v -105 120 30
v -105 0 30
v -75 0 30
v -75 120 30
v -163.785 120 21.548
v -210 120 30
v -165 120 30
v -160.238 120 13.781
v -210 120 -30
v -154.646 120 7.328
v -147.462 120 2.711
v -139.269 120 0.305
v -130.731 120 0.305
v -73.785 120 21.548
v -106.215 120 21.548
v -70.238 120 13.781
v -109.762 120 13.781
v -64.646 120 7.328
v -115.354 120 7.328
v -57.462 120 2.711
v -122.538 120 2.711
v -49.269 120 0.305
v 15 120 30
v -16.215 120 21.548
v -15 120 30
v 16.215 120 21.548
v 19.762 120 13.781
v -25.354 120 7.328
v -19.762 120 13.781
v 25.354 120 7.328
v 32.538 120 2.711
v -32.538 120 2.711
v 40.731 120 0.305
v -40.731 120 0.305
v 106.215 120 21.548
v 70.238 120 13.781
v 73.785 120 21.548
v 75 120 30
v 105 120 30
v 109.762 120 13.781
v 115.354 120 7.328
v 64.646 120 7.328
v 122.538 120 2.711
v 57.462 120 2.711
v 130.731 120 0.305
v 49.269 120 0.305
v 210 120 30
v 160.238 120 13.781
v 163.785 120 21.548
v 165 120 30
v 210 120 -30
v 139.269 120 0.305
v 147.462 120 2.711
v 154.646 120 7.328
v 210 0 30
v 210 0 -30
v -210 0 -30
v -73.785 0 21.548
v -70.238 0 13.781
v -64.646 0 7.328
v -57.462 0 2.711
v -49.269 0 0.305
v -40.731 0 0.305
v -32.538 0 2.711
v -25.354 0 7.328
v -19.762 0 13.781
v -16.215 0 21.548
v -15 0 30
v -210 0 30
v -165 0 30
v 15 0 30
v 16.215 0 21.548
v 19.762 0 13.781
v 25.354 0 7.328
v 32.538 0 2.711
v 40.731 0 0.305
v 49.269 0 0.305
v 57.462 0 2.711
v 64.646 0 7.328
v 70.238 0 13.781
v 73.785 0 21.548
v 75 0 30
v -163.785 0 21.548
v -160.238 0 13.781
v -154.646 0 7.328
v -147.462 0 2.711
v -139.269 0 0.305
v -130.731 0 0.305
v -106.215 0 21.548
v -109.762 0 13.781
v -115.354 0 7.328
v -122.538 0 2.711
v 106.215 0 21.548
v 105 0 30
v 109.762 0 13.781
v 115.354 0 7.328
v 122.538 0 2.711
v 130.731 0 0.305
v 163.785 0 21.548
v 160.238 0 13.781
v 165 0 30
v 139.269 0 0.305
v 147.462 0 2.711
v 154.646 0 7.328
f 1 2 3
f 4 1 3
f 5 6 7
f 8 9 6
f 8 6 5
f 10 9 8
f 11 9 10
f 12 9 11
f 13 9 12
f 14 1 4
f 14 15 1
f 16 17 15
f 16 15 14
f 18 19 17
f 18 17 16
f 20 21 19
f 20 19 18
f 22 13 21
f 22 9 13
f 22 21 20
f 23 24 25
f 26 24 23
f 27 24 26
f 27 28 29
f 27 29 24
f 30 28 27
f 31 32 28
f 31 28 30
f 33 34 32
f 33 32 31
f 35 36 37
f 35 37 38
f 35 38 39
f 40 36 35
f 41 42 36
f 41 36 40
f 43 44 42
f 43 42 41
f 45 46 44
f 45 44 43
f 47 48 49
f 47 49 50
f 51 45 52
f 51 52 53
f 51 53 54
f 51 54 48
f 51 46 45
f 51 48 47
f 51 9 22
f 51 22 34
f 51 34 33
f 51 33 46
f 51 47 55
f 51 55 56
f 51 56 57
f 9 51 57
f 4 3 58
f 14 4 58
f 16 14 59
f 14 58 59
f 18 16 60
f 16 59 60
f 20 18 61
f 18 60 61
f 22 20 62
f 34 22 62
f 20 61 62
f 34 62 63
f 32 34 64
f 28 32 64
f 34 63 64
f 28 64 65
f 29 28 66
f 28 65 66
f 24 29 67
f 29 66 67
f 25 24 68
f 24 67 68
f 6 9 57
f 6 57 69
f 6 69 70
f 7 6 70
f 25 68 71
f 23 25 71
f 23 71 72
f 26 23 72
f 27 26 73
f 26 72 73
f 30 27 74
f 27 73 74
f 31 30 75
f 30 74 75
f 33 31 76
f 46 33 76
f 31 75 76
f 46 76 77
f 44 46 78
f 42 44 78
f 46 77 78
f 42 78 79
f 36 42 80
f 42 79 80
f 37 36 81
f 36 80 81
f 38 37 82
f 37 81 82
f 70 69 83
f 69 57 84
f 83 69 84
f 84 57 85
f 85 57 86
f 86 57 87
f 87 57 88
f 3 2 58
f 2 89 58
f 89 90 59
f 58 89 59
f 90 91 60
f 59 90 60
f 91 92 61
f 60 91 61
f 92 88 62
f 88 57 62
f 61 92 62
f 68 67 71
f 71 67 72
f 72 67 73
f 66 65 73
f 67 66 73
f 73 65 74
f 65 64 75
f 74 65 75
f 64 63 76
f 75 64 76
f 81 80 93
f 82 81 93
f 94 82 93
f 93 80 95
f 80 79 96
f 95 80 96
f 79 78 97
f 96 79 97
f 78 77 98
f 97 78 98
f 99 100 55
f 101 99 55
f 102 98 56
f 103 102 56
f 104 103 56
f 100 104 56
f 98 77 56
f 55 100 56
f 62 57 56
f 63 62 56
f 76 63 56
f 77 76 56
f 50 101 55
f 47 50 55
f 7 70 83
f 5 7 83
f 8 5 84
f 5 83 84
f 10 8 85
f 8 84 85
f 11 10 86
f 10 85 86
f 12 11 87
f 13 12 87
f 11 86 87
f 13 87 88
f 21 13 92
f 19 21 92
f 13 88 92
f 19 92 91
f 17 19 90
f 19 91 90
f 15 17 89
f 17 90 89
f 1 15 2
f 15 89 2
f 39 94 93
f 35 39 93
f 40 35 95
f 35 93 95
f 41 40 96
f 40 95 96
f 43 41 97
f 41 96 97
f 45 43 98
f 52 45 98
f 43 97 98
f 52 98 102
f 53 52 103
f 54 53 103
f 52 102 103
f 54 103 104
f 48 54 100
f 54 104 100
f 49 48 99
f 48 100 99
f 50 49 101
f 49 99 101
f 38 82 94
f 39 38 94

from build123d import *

# Parameters (mm, degrees)
BOSS_EXTRUDE1_DEPTH = 120


with BuildPart() as part:
    # Sketch1 → Boss-Extrude1 (new body)
    with BuildSketch(Plane(origin=(0, 0, 0), x_dir=(1, 0, 0), z_dir=(0, 1, 0))):
        with BuildLine():
            Line((-105, -30), (-75, -30))
            ThreePointArc((-75, -30), (-45, 0), (-15, -30))
            Line((-15, -30), (15, -30))
            ThreePointArc((15, -30), (45, 0), (75, -30))
            Line((75, -30), (105, -30))
            ThreePointArc((105, -30), (135, 0), (165, -30))
            Line((165, -30), (210, -30))
            Line((210, -30), (210, 30))
            Line((210, 30), (-210, 30))
            Line((-210, 30), (-210, -30))
            Line((-210, -30), (-165, -30))
            ThreePointArc((-165, -30), (-135, 0), (-105, -30))
        make_face()
    extrude(amount=BOSS_EXTRUDE1_DEPTH)


solid = part.part
